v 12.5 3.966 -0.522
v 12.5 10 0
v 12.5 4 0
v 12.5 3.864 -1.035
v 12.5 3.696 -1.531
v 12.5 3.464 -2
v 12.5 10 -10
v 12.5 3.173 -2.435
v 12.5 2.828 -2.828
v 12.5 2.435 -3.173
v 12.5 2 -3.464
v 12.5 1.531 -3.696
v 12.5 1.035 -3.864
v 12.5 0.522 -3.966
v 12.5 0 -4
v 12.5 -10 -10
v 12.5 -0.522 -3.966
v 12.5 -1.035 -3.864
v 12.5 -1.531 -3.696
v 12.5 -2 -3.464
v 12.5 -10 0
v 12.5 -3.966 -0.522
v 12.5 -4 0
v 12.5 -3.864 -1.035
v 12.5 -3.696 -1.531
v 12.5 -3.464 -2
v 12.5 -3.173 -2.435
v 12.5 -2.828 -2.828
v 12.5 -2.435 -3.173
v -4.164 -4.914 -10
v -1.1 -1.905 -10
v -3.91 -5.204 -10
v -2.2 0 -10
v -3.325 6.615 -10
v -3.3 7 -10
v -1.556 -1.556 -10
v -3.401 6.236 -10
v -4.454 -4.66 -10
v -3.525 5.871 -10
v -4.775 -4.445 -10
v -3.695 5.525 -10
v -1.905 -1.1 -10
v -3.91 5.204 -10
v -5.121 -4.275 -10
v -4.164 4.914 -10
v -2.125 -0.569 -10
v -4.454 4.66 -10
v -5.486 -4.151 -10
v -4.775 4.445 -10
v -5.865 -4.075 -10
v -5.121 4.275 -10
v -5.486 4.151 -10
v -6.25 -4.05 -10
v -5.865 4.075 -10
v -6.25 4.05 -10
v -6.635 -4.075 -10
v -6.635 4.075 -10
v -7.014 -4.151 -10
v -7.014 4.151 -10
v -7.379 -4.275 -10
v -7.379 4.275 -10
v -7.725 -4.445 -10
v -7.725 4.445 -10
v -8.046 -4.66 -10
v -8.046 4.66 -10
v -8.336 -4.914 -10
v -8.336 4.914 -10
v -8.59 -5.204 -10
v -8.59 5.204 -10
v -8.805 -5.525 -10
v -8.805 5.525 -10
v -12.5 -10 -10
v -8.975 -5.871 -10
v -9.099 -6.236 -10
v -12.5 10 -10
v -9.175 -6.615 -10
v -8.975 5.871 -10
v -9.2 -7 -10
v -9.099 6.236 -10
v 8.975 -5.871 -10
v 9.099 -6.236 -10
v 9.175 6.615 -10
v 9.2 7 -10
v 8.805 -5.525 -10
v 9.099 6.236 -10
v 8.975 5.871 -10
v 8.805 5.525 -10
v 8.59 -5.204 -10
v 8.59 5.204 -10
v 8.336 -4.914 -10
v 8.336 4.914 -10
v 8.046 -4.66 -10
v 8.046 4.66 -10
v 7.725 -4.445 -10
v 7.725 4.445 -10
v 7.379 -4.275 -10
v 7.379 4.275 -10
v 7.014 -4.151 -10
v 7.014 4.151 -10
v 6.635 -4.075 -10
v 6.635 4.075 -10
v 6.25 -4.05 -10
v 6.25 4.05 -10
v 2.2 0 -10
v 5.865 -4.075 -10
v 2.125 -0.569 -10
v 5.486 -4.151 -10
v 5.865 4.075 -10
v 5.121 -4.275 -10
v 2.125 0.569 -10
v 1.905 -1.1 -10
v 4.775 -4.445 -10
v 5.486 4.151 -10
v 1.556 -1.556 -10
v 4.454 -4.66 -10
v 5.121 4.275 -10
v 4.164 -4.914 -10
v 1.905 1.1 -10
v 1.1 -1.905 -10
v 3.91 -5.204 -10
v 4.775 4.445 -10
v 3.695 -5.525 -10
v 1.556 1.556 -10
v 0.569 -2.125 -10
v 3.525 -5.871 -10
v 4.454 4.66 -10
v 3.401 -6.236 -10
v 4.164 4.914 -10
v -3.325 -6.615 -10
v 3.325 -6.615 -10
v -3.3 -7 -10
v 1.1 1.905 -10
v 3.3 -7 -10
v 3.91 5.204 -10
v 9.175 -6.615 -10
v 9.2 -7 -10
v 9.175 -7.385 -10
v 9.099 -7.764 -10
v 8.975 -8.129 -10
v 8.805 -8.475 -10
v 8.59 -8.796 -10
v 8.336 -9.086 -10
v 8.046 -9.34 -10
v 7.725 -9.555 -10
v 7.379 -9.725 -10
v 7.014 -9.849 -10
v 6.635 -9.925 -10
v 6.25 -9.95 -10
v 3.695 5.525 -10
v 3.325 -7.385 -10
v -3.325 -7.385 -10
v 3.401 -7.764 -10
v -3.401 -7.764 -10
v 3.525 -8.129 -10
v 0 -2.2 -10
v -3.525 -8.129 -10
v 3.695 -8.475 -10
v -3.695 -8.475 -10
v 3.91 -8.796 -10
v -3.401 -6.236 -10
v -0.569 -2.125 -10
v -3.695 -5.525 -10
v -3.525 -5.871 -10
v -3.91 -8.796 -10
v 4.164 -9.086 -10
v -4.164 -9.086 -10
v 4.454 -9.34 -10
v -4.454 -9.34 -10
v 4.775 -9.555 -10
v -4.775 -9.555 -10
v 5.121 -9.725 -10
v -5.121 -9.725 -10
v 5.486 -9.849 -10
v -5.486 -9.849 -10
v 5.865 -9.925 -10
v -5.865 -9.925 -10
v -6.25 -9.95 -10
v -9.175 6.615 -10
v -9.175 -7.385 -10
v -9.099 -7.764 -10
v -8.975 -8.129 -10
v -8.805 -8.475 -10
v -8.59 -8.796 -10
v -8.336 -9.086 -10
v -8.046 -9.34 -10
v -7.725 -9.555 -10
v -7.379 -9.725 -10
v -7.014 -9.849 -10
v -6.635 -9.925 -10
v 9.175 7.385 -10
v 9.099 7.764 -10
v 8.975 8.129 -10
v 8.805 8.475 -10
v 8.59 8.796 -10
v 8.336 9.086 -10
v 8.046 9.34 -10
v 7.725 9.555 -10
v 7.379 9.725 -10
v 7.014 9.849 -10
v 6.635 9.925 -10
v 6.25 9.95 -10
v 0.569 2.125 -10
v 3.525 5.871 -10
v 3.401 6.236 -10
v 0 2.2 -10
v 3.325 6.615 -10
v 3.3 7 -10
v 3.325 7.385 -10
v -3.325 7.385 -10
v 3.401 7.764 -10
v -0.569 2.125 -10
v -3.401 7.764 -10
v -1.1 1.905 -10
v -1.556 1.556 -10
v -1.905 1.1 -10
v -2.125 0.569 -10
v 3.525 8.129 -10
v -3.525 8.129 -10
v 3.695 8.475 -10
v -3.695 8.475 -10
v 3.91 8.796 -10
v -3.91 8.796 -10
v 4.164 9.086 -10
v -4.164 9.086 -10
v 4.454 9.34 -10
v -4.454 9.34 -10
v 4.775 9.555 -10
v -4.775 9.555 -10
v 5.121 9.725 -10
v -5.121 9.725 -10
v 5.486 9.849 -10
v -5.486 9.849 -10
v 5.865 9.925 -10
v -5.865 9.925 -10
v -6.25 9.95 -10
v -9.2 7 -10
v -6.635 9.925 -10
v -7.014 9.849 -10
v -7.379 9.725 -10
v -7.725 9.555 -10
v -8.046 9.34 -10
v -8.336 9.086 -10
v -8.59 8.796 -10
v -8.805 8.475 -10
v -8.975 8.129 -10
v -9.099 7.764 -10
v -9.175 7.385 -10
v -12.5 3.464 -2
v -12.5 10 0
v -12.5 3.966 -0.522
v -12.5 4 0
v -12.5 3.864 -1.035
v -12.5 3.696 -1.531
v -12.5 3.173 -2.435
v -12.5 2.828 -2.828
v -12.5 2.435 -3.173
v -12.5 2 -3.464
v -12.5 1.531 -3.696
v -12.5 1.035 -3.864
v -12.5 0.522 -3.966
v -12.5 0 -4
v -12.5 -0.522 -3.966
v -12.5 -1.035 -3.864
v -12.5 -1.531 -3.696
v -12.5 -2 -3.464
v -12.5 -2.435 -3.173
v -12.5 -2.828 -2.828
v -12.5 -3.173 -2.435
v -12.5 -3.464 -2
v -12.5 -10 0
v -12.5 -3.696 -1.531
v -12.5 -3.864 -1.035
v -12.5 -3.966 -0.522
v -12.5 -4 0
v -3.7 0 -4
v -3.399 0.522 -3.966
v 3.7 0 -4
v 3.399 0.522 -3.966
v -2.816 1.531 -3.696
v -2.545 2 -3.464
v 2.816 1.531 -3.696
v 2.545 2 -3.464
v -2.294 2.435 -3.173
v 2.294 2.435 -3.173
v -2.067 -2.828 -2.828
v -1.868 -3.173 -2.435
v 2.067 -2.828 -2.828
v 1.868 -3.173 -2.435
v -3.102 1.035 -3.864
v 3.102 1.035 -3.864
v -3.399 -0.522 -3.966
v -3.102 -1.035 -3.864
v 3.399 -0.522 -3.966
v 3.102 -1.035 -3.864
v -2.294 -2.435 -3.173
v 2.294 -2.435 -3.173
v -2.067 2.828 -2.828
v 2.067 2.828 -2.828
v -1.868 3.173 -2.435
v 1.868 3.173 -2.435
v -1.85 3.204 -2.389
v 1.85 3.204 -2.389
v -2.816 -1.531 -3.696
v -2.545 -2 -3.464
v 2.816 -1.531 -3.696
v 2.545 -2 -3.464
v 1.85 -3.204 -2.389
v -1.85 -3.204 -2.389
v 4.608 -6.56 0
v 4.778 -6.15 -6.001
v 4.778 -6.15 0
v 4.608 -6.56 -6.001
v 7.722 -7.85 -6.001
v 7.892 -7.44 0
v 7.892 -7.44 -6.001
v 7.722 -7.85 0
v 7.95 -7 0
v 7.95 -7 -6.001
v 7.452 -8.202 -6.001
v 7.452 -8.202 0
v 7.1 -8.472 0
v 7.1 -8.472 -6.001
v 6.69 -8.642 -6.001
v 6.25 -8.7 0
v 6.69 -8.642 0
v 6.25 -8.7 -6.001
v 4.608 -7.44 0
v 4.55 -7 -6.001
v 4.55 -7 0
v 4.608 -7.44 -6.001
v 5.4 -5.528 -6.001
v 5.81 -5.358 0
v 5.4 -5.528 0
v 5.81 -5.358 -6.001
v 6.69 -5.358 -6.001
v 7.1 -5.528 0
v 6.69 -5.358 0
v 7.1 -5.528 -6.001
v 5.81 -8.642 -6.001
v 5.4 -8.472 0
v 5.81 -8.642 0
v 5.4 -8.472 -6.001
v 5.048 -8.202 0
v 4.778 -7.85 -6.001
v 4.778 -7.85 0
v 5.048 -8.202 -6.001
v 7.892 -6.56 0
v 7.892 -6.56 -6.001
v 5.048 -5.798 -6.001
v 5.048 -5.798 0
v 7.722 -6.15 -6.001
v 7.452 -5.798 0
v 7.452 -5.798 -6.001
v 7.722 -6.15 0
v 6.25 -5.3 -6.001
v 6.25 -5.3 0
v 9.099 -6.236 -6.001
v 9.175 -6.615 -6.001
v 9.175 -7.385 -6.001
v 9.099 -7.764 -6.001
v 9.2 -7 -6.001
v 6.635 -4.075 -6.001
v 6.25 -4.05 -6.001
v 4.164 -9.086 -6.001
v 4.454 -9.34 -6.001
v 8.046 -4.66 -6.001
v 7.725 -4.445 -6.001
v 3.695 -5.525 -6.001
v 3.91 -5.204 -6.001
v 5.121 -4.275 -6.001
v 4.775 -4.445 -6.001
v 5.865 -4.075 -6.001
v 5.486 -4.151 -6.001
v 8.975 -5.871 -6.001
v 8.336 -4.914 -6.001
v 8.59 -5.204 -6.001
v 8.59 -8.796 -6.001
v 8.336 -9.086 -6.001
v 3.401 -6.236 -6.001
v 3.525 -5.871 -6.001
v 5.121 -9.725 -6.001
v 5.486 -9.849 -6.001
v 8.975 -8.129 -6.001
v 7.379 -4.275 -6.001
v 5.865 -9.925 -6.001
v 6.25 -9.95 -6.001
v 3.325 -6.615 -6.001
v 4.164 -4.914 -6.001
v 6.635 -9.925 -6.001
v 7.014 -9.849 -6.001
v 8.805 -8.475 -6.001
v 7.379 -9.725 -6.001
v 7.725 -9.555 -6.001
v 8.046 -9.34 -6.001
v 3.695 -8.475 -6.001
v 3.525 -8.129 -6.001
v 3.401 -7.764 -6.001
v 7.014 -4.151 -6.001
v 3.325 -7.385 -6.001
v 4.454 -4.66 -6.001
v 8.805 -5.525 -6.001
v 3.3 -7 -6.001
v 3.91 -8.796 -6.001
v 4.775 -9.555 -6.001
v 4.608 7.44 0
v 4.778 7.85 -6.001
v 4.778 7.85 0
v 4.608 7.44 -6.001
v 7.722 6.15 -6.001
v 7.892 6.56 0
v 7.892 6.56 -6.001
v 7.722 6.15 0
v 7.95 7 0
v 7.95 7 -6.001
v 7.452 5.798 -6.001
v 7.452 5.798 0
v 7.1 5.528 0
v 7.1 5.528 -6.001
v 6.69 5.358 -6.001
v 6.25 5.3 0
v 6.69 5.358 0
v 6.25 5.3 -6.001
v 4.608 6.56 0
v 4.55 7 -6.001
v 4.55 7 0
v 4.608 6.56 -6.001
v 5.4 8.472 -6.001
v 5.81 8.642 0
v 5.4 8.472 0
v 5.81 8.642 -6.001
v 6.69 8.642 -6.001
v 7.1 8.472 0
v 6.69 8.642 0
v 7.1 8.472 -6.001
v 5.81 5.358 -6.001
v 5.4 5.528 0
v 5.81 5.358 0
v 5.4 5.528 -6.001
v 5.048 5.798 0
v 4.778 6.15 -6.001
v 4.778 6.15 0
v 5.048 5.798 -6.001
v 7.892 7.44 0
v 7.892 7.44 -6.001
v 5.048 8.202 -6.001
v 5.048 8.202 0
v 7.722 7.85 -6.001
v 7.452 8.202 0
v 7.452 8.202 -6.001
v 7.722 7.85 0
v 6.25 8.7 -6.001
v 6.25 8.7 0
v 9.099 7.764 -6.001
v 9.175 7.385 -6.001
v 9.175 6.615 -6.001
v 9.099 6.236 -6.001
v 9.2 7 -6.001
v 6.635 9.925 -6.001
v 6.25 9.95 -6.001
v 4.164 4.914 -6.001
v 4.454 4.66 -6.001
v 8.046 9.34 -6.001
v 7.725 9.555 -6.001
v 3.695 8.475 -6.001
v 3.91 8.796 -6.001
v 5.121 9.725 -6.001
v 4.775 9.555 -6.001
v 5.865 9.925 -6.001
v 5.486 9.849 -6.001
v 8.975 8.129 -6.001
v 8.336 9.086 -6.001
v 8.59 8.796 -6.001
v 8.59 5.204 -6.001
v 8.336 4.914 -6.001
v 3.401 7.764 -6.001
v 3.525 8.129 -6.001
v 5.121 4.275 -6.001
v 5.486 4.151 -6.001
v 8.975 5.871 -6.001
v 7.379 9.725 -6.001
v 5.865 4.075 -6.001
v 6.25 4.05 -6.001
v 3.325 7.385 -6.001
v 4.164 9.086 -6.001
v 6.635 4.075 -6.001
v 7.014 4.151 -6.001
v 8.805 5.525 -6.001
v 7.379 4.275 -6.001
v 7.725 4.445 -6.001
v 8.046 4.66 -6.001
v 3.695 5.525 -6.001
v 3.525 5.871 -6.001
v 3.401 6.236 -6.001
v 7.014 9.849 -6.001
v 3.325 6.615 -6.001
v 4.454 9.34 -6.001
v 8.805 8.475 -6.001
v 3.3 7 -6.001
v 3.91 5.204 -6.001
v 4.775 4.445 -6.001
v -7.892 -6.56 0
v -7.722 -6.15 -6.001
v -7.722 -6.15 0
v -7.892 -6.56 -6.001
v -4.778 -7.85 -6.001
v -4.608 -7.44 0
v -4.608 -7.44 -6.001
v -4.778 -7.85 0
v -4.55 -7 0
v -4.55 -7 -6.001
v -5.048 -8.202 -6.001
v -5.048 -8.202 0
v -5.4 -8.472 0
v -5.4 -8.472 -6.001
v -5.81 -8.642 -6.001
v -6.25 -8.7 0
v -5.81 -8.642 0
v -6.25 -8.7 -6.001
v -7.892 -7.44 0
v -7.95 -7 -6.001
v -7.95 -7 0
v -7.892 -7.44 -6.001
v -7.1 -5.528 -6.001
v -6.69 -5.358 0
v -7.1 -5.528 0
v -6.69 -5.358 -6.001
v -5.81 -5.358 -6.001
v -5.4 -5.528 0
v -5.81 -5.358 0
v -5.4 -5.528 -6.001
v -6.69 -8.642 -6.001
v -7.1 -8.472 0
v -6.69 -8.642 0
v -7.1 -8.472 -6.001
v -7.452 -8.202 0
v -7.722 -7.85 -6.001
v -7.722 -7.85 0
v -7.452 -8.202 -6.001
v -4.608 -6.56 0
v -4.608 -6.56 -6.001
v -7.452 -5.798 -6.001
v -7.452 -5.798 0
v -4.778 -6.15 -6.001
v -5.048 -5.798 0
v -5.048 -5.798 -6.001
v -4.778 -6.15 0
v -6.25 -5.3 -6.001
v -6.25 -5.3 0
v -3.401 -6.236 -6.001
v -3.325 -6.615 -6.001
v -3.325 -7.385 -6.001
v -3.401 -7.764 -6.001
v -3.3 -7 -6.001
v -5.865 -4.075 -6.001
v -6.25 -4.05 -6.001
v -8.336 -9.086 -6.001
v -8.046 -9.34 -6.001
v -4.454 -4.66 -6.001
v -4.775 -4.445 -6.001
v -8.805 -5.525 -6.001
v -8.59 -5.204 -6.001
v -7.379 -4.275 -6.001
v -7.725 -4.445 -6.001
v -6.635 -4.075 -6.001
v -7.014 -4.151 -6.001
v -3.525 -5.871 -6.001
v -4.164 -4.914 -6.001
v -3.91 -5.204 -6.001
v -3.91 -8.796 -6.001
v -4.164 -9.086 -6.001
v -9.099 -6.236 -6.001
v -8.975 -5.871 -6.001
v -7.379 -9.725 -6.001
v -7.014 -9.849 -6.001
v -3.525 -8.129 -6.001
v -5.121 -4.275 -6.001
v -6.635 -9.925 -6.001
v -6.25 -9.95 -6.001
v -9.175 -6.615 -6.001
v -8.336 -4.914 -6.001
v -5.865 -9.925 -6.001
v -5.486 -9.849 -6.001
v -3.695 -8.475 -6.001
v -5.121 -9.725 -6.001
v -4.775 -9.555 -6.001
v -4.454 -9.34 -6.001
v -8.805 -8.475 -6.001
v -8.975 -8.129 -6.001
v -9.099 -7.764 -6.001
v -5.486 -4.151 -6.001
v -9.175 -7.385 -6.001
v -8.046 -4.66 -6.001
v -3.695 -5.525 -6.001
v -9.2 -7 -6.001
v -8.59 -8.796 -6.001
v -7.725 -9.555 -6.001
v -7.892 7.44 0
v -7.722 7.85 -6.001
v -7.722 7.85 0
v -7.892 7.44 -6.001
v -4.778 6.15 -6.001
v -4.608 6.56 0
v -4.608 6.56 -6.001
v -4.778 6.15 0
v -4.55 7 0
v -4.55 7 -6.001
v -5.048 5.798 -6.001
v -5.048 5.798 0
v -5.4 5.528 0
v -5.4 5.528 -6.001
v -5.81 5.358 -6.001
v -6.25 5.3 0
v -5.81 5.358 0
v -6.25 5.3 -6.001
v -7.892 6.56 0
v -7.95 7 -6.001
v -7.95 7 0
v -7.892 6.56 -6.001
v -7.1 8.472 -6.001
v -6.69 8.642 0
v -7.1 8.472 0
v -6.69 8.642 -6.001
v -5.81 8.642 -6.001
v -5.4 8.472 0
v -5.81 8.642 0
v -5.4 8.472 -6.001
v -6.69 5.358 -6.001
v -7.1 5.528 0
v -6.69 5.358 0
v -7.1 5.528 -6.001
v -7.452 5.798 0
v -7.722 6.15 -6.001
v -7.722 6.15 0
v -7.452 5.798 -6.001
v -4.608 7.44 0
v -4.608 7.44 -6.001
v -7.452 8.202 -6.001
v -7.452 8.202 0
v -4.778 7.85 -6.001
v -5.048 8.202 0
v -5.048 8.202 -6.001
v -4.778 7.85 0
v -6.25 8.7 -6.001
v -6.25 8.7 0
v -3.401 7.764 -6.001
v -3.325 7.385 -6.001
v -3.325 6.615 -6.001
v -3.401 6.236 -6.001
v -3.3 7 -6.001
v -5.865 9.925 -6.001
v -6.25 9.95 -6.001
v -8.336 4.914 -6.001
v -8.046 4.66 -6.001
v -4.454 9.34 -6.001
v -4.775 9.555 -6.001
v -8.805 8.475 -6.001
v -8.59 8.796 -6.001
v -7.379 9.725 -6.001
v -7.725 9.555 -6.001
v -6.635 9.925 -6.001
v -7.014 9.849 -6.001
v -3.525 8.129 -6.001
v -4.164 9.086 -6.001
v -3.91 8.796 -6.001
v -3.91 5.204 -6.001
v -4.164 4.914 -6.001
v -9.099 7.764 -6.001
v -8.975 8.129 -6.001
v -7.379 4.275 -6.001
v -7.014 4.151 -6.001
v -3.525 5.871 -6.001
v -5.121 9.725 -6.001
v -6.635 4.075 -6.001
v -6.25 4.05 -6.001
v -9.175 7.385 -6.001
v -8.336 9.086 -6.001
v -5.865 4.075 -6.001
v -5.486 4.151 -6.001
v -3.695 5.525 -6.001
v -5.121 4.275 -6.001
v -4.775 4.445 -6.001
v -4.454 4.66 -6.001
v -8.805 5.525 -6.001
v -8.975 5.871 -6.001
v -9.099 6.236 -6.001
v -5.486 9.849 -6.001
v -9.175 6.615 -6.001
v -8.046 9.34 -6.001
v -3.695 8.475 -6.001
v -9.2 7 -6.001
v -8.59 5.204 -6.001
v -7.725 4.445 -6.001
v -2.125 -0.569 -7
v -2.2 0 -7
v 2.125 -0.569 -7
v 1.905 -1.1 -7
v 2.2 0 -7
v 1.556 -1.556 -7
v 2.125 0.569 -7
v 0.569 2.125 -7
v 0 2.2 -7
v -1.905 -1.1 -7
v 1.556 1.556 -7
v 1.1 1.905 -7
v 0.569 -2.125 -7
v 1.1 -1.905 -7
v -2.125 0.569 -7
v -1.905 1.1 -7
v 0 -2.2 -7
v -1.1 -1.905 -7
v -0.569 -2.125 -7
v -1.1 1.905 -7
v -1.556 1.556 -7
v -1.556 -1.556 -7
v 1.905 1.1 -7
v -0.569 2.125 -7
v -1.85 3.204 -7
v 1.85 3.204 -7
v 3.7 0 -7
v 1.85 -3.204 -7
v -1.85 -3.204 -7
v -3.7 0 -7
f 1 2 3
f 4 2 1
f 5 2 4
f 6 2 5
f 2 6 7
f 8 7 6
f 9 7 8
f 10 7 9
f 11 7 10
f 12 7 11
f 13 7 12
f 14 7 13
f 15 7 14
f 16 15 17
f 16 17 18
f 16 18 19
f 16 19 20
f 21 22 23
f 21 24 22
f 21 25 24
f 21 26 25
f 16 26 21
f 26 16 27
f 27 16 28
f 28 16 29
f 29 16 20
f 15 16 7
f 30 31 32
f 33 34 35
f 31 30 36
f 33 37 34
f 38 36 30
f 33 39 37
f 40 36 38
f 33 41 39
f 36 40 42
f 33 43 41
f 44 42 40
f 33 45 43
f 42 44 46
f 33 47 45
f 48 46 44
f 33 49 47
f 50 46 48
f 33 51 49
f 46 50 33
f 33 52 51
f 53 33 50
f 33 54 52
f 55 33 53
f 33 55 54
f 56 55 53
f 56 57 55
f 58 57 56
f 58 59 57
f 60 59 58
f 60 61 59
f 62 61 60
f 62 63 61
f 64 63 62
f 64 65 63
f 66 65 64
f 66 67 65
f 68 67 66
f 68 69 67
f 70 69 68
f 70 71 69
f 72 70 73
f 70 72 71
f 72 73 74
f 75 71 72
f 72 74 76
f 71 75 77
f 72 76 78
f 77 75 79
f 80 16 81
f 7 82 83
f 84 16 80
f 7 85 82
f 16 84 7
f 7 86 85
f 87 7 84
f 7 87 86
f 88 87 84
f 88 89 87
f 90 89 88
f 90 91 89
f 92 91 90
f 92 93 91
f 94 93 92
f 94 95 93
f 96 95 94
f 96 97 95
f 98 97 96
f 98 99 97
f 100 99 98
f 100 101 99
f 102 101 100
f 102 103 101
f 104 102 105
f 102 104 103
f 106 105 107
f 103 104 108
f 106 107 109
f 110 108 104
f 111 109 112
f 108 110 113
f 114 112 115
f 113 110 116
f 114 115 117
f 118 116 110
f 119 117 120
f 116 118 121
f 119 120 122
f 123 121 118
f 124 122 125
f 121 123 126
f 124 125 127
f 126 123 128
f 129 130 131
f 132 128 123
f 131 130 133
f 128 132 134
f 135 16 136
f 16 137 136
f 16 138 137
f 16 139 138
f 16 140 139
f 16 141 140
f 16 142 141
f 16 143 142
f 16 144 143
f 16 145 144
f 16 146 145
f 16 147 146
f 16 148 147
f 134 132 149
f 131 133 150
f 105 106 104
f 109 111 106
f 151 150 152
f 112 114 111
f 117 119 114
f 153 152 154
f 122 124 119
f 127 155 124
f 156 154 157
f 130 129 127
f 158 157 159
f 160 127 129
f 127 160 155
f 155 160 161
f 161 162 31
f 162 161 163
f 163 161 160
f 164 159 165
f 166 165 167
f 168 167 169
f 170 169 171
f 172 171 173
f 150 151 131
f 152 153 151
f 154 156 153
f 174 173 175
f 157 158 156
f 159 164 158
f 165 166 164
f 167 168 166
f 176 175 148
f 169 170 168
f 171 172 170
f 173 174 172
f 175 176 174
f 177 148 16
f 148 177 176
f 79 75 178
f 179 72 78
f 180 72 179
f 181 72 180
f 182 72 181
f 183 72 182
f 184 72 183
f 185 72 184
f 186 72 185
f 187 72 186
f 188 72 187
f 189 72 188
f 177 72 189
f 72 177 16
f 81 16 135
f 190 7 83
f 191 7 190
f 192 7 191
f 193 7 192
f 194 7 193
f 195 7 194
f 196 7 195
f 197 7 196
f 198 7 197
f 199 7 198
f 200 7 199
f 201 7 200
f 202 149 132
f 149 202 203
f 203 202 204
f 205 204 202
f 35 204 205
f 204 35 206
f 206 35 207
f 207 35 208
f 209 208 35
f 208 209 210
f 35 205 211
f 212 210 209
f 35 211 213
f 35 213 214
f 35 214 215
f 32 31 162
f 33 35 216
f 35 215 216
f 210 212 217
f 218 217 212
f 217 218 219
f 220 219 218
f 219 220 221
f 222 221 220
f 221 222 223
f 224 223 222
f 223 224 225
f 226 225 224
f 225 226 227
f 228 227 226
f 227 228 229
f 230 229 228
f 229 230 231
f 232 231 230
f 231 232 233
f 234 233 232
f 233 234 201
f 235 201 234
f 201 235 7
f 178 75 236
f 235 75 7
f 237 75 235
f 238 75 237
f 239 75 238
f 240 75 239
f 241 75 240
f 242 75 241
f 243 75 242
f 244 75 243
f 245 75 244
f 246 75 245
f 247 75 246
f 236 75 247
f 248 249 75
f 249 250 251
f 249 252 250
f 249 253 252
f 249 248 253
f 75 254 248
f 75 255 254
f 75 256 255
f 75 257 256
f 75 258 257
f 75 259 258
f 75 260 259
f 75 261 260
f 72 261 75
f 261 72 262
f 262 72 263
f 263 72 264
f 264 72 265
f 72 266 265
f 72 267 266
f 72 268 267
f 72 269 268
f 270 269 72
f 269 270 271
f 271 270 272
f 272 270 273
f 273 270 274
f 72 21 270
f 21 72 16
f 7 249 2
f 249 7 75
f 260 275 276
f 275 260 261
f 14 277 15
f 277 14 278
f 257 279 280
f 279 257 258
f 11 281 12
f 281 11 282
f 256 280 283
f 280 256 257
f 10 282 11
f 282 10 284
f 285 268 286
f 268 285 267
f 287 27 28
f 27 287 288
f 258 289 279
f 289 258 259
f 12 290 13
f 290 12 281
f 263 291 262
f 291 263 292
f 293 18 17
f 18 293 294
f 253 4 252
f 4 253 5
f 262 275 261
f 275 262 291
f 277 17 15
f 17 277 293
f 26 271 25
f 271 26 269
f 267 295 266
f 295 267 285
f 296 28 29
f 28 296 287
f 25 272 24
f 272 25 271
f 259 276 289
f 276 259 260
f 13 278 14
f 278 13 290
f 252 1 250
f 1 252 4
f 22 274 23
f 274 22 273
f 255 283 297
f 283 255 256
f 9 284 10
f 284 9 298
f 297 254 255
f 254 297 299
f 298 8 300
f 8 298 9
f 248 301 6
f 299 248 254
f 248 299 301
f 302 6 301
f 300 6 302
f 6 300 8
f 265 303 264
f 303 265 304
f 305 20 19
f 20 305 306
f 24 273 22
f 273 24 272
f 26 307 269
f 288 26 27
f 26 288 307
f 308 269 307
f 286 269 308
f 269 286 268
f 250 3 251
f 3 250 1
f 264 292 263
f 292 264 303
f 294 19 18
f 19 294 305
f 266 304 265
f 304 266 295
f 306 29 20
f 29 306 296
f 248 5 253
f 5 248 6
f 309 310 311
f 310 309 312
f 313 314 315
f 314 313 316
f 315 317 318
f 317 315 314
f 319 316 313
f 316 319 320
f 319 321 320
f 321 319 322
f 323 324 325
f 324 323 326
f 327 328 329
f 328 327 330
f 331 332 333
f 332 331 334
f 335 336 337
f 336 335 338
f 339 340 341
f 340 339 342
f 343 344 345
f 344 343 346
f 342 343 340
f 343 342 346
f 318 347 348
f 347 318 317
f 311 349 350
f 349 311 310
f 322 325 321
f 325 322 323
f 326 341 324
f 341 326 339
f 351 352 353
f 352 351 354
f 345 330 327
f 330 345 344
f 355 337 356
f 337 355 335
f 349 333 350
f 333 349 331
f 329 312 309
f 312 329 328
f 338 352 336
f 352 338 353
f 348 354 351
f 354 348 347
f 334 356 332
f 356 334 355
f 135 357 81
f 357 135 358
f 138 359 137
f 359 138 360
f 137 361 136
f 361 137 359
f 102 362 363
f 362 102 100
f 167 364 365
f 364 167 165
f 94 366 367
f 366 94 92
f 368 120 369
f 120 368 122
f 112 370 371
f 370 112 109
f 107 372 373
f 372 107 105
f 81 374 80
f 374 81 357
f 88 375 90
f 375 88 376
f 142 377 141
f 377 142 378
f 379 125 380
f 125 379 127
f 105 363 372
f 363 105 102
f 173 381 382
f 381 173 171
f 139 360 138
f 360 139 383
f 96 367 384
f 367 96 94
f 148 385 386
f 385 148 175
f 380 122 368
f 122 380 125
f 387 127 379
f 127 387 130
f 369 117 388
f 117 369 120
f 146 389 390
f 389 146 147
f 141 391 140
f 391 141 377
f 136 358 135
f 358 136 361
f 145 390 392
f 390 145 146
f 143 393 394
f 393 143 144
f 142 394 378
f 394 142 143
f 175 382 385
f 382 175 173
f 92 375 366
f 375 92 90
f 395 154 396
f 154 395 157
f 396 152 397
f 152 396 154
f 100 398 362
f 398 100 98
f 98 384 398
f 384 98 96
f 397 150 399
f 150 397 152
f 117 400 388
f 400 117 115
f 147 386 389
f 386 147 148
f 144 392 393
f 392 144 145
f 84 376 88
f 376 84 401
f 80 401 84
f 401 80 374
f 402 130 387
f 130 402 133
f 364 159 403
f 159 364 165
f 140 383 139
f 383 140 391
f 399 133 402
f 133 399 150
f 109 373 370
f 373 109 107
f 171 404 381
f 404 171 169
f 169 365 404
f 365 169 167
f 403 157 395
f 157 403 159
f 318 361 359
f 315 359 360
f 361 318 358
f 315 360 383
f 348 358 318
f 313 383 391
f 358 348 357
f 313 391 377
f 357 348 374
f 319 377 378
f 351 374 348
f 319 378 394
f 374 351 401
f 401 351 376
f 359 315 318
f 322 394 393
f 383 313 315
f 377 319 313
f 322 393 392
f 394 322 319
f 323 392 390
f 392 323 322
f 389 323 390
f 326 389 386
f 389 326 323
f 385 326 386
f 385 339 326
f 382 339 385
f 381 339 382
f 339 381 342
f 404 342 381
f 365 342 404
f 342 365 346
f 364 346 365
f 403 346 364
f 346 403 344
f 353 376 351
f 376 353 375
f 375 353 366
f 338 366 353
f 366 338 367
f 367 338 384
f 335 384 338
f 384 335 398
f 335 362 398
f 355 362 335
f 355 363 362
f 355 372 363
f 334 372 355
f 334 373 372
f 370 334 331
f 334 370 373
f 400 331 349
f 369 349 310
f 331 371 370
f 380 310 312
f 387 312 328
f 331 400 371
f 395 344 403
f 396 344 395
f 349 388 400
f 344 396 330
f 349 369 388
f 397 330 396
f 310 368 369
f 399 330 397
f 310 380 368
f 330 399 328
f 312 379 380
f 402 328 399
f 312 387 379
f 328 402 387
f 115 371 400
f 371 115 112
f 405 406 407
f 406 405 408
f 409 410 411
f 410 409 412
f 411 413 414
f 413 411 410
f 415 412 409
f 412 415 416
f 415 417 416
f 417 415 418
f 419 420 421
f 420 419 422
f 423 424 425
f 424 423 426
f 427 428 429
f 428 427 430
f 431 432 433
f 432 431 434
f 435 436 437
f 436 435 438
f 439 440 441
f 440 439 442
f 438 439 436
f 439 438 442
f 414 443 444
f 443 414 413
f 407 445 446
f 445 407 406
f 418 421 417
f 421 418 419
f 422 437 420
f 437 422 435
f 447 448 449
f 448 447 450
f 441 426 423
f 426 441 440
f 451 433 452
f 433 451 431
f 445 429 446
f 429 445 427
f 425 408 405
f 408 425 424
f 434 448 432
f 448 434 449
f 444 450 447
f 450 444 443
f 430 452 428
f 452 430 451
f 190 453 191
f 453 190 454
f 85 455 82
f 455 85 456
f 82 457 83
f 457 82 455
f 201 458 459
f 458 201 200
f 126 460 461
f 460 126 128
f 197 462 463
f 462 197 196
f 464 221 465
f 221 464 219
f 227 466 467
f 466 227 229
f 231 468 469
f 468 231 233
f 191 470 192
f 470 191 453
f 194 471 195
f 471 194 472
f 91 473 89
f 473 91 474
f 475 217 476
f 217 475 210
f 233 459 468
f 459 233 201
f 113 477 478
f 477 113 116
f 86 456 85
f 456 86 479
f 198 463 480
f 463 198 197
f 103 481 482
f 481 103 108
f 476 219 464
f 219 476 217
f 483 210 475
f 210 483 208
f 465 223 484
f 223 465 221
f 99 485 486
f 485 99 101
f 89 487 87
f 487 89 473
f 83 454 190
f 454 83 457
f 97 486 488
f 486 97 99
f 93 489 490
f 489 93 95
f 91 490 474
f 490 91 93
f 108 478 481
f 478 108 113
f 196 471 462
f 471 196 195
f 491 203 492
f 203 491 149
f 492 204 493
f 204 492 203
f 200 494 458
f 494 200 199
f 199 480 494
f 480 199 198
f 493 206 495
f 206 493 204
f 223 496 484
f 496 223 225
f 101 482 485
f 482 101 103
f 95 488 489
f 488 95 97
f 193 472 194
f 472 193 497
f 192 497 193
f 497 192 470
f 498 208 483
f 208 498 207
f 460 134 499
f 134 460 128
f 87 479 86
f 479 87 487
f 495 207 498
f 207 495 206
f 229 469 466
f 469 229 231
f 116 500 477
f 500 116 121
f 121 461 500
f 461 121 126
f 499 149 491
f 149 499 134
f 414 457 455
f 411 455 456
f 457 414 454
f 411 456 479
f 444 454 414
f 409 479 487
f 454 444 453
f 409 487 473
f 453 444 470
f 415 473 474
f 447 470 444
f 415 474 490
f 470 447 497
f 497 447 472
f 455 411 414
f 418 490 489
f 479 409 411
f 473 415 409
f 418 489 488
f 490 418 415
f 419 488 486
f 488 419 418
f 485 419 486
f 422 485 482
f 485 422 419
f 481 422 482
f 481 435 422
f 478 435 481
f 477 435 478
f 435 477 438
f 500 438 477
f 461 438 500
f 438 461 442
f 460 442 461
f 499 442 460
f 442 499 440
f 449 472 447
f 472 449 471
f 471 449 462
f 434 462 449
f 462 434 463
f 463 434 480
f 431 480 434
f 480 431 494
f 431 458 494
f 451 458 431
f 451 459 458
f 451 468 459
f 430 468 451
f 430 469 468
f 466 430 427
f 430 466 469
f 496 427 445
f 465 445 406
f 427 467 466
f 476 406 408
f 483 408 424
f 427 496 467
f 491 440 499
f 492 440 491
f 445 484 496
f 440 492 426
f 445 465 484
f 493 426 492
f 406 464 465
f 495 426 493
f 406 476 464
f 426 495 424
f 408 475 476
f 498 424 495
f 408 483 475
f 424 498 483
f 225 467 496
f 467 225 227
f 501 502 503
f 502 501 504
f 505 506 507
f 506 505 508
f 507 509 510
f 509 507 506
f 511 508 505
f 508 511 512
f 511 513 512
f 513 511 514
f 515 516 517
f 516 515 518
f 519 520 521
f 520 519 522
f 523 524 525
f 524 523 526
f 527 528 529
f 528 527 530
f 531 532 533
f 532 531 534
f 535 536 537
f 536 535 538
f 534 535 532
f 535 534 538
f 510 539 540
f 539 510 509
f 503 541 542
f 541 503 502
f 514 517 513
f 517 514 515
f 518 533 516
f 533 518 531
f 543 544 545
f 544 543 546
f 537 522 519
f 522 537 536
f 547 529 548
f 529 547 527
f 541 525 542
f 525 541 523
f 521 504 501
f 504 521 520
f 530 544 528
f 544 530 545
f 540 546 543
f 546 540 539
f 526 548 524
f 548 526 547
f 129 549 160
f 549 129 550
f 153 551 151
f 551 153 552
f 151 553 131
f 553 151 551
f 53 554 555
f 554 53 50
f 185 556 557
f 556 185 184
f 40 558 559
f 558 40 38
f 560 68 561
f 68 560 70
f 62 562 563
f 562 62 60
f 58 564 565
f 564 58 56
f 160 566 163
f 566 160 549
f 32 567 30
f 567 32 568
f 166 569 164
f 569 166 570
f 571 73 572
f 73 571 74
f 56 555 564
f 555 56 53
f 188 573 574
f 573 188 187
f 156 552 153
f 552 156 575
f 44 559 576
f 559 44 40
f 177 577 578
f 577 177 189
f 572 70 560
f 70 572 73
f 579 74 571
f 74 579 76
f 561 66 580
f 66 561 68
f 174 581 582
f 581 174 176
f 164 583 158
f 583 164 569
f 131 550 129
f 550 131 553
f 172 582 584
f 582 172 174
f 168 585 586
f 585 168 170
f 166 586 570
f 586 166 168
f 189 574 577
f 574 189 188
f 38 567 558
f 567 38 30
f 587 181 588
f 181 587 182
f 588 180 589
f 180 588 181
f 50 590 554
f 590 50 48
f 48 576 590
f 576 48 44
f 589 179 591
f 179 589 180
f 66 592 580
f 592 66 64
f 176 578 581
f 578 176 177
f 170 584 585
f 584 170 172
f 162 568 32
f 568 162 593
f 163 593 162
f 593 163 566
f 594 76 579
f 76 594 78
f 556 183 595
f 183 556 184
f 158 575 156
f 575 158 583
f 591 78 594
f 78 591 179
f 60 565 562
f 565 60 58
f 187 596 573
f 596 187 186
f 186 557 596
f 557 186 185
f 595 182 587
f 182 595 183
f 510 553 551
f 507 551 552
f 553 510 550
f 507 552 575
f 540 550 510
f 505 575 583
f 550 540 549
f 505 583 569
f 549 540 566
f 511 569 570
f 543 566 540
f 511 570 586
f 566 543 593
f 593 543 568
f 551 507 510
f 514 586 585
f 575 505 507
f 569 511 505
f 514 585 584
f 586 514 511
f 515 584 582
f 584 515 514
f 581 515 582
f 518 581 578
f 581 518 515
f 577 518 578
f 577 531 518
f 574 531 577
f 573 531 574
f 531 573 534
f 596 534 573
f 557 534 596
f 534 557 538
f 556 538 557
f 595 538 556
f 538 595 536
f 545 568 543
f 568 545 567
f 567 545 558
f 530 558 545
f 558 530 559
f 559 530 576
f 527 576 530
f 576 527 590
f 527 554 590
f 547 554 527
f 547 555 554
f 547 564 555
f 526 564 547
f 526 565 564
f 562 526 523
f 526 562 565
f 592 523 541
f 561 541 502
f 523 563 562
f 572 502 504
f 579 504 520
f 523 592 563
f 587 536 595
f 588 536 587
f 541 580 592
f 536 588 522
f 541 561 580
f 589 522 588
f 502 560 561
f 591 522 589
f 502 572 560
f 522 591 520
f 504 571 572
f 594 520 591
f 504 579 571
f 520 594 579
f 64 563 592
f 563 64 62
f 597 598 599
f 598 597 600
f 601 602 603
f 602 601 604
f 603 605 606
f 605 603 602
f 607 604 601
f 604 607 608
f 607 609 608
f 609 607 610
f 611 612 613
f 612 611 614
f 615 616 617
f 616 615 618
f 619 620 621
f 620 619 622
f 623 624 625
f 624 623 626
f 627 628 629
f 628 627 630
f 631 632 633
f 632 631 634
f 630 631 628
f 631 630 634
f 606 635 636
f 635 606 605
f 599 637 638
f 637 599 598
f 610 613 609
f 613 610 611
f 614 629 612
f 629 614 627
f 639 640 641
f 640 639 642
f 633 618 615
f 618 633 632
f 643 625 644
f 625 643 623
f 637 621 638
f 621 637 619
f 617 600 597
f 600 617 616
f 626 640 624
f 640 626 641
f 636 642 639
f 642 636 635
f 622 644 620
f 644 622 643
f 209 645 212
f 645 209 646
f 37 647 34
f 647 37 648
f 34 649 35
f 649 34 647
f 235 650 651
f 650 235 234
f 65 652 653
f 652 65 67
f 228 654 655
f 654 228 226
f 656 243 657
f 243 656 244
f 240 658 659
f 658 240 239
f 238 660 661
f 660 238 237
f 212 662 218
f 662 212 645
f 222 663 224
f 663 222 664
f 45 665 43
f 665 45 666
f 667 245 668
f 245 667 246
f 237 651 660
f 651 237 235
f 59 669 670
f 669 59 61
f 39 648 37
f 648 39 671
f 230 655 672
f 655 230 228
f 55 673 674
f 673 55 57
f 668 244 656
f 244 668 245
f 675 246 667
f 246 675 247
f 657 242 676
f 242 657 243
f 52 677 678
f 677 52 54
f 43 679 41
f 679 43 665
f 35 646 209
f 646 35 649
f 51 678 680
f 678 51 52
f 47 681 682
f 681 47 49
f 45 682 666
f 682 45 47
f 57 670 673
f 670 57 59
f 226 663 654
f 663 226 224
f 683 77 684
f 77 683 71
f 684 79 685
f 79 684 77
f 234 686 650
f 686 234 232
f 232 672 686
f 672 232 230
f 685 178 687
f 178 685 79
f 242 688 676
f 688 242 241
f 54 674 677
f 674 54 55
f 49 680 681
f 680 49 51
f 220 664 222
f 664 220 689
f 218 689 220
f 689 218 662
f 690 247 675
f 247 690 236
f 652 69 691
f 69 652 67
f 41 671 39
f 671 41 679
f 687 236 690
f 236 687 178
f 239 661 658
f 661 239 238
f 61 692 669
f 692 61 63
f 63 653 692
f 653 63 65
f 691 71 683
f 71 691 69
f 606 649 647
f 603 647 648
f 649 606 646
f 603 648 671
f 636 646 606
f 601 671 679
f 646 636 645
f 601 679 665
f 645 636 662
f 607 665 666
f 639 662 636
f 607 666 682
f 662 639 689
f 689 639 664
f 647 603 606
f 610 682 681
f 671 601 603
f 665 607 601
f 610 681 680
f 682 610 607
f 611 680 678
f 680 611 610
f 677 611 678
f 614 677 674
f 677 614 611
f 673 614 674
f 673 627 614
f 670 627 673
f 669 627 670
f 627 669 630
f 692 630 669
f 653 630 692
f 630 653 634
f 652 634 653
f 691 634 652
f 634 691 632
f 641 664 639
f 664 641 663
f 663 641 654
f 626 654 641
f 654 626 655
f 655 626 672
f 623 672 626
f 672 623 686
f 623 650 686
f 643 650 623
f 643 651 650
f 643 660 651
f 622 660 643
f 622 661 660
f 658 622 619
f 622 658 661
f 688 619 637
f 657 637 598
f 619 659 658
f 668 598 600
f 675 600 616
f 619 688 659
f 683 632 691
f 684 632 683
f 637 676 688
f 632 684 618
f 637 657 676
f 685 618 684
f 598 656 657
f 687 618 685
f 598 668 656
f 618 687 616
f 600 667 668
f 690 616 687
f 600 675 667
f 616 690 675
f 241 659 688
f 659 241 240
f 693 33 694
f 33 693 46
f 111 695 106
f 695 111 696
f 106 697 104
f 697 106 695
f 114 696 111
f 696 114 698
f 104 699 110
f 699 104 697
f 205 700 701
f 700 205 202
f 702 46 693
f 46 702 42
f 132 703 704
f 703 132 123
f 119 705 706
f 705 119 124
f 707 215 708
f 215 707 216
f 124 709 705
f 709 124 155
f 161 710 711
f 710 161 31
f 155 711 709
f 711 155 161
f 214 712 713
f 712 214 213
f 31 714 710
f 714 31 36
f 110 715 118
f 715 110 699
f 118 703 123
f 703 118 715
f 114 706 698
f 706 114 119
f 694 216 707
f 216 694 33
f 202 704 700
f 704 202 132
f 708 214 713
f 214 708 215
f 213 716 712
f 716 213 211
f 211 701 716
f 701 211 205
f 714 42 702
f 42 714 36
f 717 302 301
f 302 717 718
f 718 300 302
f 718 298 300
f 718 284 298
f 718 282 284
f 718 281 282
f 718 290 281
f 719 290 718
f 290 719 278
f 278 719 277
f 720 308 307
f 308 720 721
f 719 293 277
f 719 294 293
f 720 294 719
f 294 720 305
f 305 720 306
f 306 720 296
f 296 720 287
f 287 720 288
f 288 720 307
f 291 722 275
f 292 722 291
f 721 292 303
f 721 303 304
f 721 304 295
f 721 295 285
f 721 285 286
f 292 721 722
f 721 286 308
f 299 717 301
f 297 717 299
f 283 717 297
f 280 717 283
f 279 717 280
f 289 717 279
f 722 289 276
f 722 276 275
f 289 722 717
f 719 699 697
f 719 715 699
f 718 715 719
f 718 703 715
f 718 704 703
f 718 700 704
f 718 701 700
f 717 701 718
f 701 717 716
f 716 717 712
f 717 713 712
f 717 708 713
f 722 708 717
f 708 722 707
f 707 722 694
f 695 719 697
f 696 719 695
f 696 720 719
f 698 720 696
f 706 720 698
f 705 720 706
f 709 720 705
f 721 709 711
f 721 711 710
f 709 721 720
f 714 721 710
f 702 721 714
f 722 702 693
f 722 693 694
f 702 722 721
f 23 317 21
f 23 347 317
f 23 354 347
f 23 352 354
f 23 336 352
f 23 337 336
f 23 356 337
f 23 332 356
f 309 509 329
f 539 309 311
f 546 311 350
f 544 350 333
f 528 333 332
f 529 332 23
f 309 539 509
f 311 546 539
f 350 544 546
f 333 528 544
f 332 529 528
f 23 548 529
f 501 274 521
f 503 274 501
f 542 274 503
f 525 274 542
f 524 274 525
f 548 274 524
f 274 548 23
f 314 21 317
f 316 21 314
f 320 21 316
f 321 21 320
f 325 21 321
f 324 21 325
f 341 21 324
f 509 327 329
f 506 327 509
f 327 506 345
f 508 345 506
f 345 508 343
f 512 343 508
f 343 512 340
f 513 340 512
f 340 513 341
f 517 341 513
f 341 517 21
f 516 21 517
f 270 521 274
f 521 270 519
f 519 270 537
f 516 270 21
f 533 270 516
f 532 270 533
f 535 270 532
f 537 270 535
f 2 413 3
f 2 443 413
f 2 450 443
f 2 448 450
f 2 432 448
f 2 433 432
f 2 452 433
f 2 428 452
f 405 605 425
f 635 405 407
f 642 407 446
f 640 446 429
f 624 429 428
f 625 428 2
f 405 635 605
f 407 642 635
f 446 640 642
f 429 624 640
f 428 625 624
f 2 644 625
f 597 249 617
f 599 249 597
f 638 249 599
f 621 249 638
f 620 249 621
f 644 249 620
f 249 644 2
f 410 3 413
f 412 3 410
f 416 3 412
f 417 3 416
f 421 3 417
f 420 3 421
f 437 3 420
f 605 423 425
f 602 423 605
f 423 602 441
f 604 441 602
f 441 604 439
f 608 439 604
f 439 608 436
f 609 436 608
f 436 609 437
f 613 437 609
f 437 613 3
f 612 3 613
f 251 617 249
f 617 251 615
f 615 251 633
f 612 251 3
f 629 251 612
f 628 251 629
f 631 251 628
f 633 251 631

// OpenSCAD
// Music stand clamp

// Copyright (C) 2015 Jeremy Bennett <jeremy@jeremybennett.com>

// Contributor: Jeremy Bennett <jeremy@jeremybennett.com>

// This file is licensed under the Creative Commons Attribution-ShareAlike 3.0
// Unported License. To view a copy of this license, visit
// http://creativecommons.org/licenses/by-sa/3.0/ or send a letter to Creative
// Commons, PO Box 1866, Mountain View, CA 94042, USA.

// 45678901234567890123456789012345678901234567890123456789012345678901234567890


// This clamp was designed to stop my music stand legs splaying around after
// its original locking screw stripped its thread.  But it would work for any
// situation where you need a lockable clamp on a bar.

// It is designed for any situation where you cannot slip the clamp over the
// end of the bar, so the clamp must be in two halves.

// In the main design, the hole for the main bar is horizontal, so all the
// other holes etc are vertical, thereby reducing the number of cylinders
// needing rotating.  The final parts are rotated for ease of printing.


// Small amount to ensure overaps when needed
EPS = 0.001;

// Amount around shanks, heads etc, to allow for printer overflow
GAP = 0.2;

// Standard constants
M3_SHANK_R = 3.0 / 2 + GAP;
M3_HEAD_R   = 5.5 / 2 + GAP;
M4_SHANK_R = 4.0 / 2 + GAP;
M4_HEAD_R   = 7.0 / 2 + GAP;
M5_SHANK_R = 5.0 / 2 + GAP;
M5_HEAD_R   = 8.0 / 2 + GAP;

// Constants defining the design
SHANK_R = M3_SHANK_R;                 // Main construction bolts
HEAD_R   = M3_HEAD_R;
HEAD_H   = 4.0;
NUT_H    = 3.0;
LENGTH   = 20.0;

WING_SHANK_R = M4_SHANK_R;            // Wing bolt for locking
WING_HEAD_R   = M4_HEAD_R;

LENGTH  = 25.0;                         // Block dimensions
BREADTH = 20.0;
DEPTH   = 20.0;

BAR_R = 7.6 / 2 + GAP;                  // The main bar being clamped


// The basic block with a horizontal hole in it
module block () {
    difference () {
        cube (size = [LENGTH, BREADTH, DEPTH], center = true);
        rotate (a = [0, 90, 0])
            cylinder (r = BAR_R, h = LENGTH * 2, center = true, $fn = 48);
    }
}


// A bolt hole, with space for the head
module bolt_hole () {
    union () {
        cylinder (r = SHANK_R, h = DEPTH + EPS, center = true, $fn = 24);
        translate (v = [0, 0, (DEPTH - HEAD_H) / 2 + EPS])
            cylinder (r = HEAD_R, h = HEAD_H, center = true, $fn = 48);
        translate (v = [0, 0, - (DEPTH - NUT_H) / 2 - EPS])
            cylinder (r = HEAD_R, h = NUT_H, center = true, $fn = 6);
    }
}

// Set of bolts
module bolts () {
    b_off = (BREADTH + 2 * BAR_R) / 4;
    l_off = LENGTH / 4;
    translate (v = [ l_off,  b_off , 0])
        bolt_hole ();
    translate (v = [ l_off, -b_off , 0])
        bolt_hole ();
    translate (v = [-l_off,  b_off , 0])
        bolt_hole ();
    translate (v = [-l_off, -b_off , 0])
        bolt_hole ();
}


// Wing nut and bolt tighener
module wing () {
    union () {
        cylinder (r = WING_SHANK_R, h = DEPTH, center = false, $fn = 24);
        cylinder (r = WING_HEAD_R, h = NUT_H + BAR_R, center = false, $fn = 6);
    }
}


// The clamp proper
module clamp () {
    difference () {
        block ();
        bolts ();
        wing ();
    }
}


// Top half of clamp
module clamp_top () {
    intersection () {
        clamp ();
        translate (v = [0, 0, DEPTH])
            cube (size = [LENGTH * 2, BREADTH * 2, DEPTH *2], center = true);
    }
}


// Bottom half of clamp
module clamp_bottom () {
    intersection () {
        clamp ();
        translate (v = [0, 0, -DEPTH])
             ube (size = [LENGTH * 2, BREADTH * 2, DEPTH *2], center = true);
    }
}


IS_TOP = true;

if (IS_TOP) {
     // Invert for printing
     rotate (a = [180, 0, 0])
         clamp_top ();
} else {
     clamp_bottom ();
}
